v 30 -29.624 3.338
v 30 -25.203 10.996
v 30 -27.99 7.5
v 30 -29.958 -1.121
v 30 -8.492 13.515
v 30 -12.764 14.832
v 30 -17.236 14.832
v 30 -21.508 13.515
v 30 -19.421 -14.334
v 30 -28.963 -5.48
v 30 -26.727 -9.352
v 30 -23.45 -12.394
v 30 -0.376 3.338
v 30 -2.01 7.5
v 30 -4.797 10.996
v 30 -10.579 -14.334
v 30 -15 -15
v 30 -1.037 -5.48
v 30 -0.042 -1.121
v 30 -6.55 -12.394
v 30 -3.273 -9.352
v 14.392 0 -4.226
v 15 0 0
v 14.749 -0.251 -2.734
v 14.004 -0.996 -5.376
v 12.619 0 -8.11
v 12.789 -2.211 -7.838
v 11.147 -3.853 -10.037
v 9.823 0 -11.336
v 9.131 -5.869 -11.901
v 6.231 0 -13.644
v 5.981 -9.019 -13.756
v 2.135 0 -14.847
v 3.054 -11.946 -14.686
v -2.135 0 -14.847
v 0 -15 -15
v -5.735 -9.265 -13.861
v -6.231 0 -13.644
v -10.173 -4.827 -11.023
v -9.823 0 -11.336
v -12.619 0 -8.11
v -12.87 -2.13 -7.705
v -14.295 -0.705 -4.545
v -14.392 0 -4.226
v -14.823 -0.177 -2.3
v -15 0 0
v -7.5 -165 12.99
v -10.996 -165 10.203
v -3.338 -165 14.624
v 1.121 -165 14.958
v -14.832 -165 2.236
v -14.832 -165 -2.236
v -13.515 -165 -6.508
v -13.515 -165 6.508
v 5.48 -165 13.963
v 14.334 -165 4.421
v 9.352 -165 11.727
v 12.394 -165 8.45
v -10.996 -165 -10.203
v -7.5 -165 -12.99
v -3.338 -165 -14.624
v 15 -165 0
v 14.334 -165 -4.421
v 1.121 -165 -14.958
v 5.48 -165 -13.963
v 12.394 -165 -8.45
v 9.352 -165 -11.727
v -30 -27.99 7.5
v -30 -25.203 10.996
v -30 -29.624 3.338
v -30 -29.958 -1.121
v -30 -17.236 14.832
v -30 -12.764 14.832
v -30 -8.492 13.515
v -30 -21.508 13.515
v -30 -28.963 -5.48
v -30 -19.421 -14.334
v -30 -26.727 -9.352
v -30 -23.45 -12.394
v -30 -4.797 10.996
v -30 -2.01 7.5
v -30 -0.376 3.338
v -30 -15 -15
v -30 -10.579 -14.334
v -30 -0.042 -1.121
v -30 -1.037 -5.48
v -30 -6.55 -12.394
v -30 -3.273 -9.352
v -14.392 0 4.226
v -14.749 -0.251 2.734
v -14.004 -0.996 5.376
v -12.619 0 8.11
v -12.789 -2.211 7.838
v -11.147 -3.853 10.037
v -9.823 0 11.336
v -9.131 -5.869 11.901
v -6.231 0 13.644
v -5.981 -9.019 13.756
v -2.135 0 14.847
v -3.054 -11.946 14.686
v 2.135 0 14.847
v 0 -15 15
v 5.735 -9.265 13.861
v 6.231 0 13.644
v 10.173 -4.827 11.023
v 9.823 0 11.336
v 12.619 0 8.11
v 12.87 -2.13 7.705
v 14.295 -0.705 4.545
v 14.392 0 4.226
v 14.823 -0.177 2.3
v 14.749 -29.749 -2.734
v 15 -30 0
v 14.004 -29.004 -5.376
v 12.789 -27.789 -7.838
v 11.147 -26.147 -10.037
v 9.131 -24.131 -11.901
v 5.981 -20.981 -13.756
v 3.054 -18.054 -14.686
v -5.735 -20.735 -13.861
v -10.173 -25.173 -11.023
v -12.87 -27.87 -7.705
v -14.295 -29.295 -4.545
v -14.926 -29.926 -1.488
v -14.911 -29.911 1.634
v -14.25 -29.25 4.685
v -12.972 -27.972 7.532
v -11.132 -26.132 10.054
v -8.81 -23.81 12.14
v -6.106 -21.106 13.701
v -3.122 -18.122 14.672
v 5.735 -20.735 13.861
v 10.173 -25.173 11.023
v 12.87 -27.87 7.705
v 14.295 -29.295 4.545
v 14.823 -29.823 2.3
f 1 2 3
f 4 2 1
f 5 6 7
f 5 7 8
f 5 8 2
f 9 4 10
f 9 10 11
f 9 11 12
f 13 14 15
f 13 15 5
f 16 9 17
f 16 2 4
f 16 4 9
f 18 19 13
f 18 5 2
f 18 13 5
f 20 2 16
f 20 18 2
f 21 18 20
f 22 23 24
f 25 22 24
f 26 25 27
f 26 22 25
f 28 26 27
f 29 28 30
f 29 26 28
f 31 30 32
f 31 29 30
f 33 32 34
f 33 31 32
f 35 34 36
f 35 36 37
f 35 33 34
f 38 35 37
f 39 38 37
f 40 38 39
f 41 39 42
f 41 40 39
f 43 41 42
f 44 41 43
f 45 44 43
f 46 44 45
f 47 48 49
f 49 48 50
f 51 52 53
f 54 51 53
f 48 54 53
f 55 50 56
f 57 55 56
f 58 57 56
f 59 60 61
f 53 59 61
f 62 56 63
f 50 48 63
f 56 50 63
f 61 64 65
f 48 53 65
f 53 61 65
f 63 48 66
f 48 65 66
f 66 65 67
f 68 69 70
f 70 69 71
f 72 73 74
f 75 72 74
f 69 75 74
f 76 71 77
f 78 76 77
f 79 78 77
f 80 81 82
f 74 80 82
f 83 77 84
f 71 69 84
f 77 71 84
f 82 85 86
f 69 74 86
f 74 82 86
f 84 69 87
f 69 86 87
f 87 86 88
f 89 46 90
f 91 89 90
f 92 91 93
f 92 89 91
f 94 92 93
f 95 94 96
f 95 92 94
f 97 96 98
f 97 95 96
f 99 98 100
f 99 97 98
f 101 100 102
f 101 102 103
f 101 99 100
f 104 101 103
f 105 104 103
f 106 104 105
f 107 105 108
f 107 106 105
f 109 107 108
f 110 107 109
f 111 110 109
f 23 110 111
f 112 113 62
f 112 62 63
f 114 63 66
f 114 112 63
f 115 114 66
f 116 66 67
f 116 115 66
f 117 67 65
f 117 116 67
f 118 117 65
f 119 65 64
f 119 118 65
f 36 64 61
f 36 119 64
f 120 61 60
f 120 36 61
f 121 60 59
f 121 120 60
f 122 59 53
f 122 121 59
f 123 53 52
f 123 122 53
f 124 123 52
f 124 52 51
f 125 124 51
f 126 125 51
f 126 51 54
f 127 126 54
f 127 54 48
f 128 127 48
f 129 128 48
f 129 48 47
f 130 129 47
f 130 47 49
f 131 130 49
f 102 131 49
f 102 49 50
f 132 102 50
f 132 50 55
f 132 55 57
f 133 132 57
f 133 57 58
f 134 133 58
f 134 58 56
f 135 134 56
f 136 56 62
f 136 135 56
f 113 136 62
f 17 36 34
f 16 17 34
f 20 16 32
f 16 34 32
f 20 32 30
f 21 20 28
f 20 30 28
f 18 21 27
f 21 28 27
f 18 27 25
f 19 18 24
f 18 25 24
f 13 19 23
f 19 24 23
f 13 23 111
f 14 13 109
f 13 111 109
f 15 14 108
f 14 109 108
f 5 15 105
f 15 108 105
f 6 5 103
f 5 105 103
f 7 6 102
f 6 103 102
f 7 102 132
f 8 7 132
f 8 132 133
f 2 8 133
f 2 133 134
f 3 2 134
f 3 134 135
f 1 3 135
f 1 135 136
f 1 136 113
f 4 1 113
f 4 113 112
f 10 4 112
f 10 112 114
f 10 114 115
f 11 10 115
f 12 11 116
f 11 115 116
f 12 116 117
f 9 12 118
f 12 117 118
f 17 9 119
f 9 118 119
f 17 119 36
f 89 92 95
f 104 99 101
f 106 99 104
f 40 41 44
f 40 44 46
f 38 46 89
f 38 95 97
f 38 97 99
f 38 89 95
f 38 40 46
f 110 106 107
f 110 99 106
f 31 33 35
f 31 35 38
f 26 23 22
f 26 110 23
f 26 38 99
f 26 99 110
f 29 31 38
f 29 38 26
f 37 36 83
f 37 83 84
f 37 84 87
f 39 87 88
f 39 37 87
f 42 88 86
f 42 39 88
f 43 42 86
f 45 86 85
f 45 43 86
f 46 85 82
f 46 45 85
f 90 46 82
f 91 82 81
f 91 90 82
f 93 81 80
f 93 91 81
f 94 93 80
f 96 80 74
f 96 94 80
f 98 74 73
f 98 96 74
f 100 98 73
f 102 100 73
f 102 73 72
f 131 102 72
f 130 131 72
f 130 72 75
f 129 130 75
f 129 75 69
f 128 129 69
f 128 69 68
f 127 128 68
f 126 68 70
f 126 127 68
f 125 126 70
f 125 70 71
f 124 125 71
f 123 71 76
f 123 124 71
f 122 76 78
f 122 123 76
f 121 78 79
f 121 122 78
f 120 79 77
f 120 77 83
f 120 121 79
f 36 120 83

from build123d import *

# Parameters (mm, degrees)
ESBO_O1_R                     = 15
RESSALTO_EXTRUS_O1_DEPTH      = 165
RESSALTO_EXTRUS_O2_DEPTH      = 30
RESSALTO_EXTRUS_O2_DEPTH_BACK = 30
ESBO_O3_R                     = 15


with BuildPart() as part:
    # Esboço1 → Ressalto-extrusão1 (new body)
    with BuildSketch(Plane(origin=(0, 0, 0), x_dir=(1, 0, 0), z_dir=(0, 1, 0))):
        Circle(ESBO_O1_R)
    extrude(amount=-RESSALTO_EXTRUS_O1_DEPTH)

    # Esboço3 → Ressalto-extrusão2 (add, two sides: drawn at the far end of the back side and taken through both)
    with BuildSketch(Plane(origin=(0, 0, 0), x_dir=(0, 0, -1), z_dir=(1, 0, 0)).offset(-RESSALTO_EXTRUS_O2_DEPTH_BACK)):
        with Locations((0, -15)):
            Circle(ESBO_O3_R)
    extrude(amount=RESSALTO_EXTRUS_O2_DEPTH + RESSALTO_EXTRUS_O2_DEPTH_BACK)


solid = part.part
